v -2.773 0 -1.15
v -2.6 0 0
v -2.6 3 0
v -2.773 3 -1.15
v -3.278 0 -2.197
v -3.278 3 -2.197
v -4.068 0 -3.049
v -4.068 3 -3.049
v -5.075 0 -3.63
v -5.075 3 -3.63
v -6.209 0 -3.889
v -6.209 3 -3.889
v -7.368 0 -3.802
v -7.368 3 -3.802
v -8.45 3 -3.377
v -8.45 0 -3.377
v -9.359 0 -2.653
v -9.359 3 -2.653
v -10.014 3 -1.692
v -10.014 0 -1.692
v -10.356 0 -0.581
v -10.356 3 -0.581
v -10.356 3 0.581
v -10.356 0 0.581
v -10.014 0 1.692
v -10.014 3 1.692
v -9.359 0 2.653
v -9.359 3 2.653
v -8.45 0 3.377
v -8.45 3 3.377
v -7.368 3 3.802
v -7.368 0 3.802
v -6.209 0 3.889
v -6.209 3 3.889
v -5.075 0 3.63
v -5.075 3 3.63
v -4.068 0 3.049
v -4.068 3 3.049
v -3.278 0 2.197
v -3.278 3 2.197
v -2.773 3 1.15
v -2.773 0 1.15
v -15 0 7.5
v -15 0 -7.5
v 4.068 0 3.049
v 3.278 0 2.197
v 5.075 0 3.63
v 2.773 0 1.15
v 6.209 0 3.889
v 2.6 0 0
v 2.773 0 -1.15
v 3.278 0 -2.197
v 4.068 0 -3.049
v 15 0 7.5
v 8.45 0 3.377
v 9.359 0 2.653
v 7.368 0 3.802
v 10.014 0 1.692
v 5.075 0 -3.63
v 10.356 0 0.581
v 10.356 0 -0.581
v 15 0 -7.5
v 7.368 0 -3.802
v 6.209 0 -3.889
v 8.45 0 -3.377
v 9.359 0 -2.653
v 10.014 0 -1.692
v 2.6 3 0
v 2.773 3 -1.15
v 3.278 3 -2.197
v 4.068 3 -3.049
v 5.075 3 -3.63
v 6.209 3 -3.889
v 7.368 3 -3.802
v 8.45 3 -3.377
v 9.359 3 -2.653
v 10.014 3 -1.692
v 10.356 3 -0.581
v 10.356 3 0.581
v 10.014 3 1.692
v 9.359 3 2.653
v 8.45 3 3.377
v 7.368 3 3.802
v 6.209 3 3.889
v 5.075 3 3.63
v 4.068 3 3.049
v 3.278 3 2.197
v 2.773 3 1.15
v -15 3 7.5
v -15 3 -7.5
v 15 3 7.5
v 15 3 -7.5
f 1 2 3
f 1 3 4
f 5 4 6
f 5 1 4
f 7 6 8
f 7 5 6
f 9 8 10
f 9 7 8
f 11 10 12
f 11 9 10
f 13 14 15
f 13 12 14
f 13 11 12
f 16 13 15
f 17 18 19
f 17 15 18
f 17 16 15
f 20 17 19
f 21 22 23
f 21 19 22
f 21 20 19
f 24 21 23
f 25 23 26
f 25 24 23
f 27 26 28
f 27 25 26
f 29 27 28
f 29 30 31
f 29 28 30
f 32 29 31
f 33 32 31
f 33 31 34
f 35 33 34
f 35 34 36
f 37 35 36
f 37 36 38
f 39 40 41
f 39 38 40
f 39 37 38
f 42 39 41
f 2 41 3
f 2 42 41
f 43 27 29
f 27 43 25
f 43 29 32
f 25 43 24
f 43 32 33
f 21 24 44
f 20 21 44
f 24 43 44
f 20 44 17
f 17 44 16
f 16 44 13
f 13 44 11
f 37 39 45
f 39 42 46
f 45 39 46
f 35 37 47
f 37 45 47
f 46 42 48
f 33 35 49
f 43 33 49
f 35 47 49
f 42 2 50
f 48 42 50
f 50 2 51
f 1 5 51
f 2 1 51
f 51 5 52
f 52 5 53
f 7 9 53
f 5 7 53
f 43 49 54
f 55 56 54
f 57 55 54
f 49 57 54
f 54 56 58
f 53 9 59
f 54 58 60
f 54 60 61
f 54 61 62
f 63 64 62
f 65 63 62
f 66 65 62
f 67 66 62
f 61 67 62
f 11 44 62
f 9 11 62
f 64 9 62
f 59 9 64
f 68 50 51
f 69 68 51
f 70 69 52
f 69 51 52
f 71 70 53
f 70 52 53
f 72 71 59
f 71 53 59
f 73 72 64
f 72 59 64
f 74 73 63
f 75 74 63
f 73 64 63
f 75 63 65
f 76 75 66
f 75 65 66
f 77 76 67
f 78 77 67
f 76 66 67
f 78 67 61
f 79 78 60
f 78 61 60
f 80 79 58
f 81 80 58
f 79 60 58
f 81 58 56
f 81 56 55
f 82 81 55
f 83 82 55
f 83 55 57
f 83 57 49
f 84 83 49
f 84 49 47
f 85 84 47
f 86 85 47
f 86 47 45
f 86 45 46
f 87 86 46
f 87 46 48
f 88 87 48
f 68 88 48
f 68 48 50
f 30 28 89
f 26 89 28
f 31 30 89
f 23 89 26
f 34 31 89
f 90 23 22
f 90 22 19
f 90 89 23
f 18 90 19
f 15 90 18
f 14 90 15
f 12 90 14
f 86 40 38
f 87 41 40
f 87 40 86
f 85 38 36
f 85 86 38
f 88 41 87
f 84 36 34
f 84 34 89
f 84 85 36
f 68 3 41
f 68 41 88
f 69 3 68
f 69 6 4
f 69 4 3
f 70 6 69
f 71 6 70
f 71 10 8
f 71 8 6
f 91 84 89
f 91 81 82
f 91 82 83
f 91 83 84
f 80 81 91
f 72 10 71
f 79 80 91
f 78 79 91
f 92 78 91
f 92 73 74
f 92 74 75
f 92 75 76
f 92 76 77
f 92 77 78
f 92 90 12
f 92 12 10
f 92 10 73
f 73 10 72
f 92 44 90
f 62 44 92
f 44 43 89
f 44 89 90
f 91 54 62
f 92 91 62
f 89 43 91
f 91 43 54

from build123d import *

# Parameters (mm, degrees)
SKETCH1_W           = 30
SKETCH1_H           = 15
BOSS_EXTRUDE1_DEPTH = 3
CUT_EXTRUDE1_START  = -4
SKETCH2_R           = 3.9
CUT_EXTRUDE1_DEPTH  = 5


with BuildPart() as part:
    # Sketch1 → Boss-Extrude1 (new body)
    with BuildSketch(Plane(origin=(0, 0, 0), x_dir=(1, 0, 0), z_dir=(0, 1, 0))):
        Rectangle(SKETCH1_W, SKETCH1_H)
    extrude(amount=BOSS_EXTRUDE1_DEPTH)

    # Sketch2 → Cut-Extrude1 (cut)
    with BuildSketch(Plane(origin=(0, 3, 0), x_dir=(1, 0, 0), z_dir=(0, 1, 0)).offset(CUT_EXTRUDE1_START)):
        with Locations((-6.5, 0)):
            Circle(SKETCH2_R)
    cut_extrude1 = extrude(amount=CUT_EXTRUDE1_DEPTH, mode=Mode.SUBTRACT)

    # Mirror1: Cut-Extrude1 across plane
    add(cut_extrude1.mirror(Plane(origin=(0, 0, 0), x_dir=(0, 0, 1), z_dir=(1, 0, 0))), mode=Mode.SUBTRACT)


solid = part.part
